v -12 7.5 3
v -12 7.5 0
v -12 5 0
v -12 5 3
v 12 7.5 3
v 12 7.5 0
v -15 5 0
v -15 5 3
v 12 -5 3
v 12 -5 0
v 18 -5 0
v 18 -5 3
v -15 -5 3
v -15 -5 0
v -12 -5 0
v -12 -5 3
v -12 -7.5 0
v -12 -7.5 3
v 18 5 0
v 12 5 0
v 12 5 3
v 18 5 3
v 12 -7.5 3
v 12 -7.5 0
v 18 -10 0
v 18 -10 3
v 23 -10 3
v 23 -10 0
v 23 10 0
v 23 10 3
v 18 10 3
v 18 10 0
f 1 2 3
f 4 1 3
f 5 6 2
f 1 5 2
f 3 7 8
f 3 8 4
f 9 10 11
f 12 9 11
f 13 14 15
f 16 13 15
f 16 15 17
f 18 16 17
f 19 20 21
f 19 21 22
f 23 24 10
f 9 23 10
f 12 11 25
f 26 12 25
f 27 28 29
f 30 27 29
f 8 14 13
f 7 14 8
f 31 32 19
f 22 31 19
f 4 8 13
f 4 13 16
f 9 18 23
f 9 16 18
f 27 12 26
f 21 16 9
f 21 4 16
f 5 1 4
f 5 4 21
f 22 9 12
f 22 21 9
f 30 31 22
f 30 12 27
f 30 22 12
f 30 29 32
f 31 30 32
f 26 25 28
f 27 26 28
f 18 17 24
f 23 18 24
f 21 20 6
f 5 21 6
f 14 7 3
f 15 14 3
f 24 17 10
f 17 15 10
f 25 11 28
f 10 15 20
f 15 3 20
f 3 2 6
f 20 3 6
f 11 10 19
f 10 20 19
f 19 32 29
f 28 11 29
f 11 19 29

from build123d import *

# Parameters (mm, degrees)
ESBO_O1_W                = 3
ESBO_O1_H                = 10
ESBO_O1_W_2              = 6
RESSALTO_EXTRUS_O1_DEPTH = 3


with BuildPart() as part:
    # Esboço1 → Ressalto-extrusão1 (new body)
    with BuildSketch(Plane.XY):
        Polygon((-12, -5), (-12, -7.5), (12, -7.5), (12, -5), (12, 5), (12, 7.5), (-12, 7.5), (-12, 5), align=None)
        with Locations((-13.5, 0)):
            Rectangle(ESBO_O1_W, ESBO_O1_H)
        with Locations((15, 0)):
            Rectangle(ESBO_O1_W_2, ESBO_O1_H)
        Polygon((18, 5), (18, -5), (18, -10), (23, -10), (23, 10), (18, 10), align=None)
    extrude(amount=RESSALTO_EXTRUS_O1_DEPTH)


solid = part.part
